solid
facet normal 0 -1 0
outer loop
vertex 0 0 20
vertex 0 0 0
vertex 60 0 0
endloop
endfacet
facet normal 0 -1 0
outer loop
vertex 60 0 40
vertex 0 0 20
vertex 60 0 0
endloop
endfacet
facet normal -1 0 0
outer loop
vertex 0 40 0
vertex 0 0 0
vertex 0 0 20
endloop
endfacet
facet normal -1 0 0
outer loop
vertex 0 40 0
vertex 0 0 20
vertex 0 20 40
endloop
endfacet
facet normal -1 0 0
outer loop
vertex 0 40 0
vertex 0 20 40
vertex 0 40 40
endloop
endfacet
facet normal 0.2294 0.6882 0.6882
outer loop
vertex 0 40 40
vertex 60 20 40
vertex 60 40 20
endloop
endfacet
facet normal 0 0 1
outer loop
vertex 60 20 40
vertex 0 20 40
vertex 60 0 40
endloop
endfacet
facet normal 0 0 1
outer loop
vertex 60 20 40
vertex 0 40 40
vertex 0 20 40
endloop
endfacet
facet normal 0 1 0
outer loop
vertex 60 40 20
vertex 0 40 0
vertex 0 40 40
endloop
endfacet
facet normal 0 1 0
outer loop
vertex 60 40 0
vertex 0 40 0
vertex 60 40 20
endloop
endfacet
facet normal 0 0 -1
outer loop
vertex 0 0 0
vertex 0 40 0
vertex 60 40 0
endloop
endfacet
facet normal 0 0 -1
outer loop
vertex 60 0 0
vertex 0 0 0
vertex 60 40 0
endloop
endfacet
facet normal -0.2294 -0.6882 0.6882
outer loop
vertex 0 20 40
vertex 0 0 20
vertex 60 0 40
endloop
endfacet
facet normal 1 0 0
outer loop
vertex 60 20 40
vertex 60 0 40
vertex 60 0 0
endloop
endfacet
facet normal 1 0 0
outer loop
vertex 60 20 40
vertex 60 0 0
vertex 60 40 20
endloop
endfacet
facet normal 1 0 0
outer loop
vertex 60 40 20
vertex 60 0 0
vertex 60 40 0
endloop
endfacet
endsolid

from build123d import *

# Parameters (mm, degrees)
F0_W     = 60
F0_H     = 40
F1_DEPTH = 40
F5_DEPTH = 63.246553
F8_DEPTH = 63.246553


with BuildPart() as f1:
    # F0 (on Top) → F1 (new body)
    with BuildSketch(Plane.XY):
        with Locations((30, 20)):
            Rectangle(F0_W, F0_H)
    extrude(amount=F1_DEPTH)

    # F4 (on face) → F5 (cut, through all)
    with BuildSketch(Plane(origin=(-6, 2, 0), x_dir=(0.316228, 0.948683, 0), z_dir=(0.948683, -0.316228, 0))):
        Polygon((18.973666, 40), (0, 40), (0, 20), align=None)
    extrude(amount=F5_DEPTH, mode=Mode.SUBTRACT)

    # F7 (on face) → F8 (cut, through all)
    with BuildSketch(Plane(origin=(48, -16, 0), x_dir=(0.316228, 0.948683, 0), z_dir=(0.948683, -0.316228, 0))):
        Polygon((56.920998, 40), (37.947332, 40), (56.920998, 20), align=None)
    extrude(amount=-F8_DEPTH, mode=Mode.SUBTRACT)


solid = f1.part
